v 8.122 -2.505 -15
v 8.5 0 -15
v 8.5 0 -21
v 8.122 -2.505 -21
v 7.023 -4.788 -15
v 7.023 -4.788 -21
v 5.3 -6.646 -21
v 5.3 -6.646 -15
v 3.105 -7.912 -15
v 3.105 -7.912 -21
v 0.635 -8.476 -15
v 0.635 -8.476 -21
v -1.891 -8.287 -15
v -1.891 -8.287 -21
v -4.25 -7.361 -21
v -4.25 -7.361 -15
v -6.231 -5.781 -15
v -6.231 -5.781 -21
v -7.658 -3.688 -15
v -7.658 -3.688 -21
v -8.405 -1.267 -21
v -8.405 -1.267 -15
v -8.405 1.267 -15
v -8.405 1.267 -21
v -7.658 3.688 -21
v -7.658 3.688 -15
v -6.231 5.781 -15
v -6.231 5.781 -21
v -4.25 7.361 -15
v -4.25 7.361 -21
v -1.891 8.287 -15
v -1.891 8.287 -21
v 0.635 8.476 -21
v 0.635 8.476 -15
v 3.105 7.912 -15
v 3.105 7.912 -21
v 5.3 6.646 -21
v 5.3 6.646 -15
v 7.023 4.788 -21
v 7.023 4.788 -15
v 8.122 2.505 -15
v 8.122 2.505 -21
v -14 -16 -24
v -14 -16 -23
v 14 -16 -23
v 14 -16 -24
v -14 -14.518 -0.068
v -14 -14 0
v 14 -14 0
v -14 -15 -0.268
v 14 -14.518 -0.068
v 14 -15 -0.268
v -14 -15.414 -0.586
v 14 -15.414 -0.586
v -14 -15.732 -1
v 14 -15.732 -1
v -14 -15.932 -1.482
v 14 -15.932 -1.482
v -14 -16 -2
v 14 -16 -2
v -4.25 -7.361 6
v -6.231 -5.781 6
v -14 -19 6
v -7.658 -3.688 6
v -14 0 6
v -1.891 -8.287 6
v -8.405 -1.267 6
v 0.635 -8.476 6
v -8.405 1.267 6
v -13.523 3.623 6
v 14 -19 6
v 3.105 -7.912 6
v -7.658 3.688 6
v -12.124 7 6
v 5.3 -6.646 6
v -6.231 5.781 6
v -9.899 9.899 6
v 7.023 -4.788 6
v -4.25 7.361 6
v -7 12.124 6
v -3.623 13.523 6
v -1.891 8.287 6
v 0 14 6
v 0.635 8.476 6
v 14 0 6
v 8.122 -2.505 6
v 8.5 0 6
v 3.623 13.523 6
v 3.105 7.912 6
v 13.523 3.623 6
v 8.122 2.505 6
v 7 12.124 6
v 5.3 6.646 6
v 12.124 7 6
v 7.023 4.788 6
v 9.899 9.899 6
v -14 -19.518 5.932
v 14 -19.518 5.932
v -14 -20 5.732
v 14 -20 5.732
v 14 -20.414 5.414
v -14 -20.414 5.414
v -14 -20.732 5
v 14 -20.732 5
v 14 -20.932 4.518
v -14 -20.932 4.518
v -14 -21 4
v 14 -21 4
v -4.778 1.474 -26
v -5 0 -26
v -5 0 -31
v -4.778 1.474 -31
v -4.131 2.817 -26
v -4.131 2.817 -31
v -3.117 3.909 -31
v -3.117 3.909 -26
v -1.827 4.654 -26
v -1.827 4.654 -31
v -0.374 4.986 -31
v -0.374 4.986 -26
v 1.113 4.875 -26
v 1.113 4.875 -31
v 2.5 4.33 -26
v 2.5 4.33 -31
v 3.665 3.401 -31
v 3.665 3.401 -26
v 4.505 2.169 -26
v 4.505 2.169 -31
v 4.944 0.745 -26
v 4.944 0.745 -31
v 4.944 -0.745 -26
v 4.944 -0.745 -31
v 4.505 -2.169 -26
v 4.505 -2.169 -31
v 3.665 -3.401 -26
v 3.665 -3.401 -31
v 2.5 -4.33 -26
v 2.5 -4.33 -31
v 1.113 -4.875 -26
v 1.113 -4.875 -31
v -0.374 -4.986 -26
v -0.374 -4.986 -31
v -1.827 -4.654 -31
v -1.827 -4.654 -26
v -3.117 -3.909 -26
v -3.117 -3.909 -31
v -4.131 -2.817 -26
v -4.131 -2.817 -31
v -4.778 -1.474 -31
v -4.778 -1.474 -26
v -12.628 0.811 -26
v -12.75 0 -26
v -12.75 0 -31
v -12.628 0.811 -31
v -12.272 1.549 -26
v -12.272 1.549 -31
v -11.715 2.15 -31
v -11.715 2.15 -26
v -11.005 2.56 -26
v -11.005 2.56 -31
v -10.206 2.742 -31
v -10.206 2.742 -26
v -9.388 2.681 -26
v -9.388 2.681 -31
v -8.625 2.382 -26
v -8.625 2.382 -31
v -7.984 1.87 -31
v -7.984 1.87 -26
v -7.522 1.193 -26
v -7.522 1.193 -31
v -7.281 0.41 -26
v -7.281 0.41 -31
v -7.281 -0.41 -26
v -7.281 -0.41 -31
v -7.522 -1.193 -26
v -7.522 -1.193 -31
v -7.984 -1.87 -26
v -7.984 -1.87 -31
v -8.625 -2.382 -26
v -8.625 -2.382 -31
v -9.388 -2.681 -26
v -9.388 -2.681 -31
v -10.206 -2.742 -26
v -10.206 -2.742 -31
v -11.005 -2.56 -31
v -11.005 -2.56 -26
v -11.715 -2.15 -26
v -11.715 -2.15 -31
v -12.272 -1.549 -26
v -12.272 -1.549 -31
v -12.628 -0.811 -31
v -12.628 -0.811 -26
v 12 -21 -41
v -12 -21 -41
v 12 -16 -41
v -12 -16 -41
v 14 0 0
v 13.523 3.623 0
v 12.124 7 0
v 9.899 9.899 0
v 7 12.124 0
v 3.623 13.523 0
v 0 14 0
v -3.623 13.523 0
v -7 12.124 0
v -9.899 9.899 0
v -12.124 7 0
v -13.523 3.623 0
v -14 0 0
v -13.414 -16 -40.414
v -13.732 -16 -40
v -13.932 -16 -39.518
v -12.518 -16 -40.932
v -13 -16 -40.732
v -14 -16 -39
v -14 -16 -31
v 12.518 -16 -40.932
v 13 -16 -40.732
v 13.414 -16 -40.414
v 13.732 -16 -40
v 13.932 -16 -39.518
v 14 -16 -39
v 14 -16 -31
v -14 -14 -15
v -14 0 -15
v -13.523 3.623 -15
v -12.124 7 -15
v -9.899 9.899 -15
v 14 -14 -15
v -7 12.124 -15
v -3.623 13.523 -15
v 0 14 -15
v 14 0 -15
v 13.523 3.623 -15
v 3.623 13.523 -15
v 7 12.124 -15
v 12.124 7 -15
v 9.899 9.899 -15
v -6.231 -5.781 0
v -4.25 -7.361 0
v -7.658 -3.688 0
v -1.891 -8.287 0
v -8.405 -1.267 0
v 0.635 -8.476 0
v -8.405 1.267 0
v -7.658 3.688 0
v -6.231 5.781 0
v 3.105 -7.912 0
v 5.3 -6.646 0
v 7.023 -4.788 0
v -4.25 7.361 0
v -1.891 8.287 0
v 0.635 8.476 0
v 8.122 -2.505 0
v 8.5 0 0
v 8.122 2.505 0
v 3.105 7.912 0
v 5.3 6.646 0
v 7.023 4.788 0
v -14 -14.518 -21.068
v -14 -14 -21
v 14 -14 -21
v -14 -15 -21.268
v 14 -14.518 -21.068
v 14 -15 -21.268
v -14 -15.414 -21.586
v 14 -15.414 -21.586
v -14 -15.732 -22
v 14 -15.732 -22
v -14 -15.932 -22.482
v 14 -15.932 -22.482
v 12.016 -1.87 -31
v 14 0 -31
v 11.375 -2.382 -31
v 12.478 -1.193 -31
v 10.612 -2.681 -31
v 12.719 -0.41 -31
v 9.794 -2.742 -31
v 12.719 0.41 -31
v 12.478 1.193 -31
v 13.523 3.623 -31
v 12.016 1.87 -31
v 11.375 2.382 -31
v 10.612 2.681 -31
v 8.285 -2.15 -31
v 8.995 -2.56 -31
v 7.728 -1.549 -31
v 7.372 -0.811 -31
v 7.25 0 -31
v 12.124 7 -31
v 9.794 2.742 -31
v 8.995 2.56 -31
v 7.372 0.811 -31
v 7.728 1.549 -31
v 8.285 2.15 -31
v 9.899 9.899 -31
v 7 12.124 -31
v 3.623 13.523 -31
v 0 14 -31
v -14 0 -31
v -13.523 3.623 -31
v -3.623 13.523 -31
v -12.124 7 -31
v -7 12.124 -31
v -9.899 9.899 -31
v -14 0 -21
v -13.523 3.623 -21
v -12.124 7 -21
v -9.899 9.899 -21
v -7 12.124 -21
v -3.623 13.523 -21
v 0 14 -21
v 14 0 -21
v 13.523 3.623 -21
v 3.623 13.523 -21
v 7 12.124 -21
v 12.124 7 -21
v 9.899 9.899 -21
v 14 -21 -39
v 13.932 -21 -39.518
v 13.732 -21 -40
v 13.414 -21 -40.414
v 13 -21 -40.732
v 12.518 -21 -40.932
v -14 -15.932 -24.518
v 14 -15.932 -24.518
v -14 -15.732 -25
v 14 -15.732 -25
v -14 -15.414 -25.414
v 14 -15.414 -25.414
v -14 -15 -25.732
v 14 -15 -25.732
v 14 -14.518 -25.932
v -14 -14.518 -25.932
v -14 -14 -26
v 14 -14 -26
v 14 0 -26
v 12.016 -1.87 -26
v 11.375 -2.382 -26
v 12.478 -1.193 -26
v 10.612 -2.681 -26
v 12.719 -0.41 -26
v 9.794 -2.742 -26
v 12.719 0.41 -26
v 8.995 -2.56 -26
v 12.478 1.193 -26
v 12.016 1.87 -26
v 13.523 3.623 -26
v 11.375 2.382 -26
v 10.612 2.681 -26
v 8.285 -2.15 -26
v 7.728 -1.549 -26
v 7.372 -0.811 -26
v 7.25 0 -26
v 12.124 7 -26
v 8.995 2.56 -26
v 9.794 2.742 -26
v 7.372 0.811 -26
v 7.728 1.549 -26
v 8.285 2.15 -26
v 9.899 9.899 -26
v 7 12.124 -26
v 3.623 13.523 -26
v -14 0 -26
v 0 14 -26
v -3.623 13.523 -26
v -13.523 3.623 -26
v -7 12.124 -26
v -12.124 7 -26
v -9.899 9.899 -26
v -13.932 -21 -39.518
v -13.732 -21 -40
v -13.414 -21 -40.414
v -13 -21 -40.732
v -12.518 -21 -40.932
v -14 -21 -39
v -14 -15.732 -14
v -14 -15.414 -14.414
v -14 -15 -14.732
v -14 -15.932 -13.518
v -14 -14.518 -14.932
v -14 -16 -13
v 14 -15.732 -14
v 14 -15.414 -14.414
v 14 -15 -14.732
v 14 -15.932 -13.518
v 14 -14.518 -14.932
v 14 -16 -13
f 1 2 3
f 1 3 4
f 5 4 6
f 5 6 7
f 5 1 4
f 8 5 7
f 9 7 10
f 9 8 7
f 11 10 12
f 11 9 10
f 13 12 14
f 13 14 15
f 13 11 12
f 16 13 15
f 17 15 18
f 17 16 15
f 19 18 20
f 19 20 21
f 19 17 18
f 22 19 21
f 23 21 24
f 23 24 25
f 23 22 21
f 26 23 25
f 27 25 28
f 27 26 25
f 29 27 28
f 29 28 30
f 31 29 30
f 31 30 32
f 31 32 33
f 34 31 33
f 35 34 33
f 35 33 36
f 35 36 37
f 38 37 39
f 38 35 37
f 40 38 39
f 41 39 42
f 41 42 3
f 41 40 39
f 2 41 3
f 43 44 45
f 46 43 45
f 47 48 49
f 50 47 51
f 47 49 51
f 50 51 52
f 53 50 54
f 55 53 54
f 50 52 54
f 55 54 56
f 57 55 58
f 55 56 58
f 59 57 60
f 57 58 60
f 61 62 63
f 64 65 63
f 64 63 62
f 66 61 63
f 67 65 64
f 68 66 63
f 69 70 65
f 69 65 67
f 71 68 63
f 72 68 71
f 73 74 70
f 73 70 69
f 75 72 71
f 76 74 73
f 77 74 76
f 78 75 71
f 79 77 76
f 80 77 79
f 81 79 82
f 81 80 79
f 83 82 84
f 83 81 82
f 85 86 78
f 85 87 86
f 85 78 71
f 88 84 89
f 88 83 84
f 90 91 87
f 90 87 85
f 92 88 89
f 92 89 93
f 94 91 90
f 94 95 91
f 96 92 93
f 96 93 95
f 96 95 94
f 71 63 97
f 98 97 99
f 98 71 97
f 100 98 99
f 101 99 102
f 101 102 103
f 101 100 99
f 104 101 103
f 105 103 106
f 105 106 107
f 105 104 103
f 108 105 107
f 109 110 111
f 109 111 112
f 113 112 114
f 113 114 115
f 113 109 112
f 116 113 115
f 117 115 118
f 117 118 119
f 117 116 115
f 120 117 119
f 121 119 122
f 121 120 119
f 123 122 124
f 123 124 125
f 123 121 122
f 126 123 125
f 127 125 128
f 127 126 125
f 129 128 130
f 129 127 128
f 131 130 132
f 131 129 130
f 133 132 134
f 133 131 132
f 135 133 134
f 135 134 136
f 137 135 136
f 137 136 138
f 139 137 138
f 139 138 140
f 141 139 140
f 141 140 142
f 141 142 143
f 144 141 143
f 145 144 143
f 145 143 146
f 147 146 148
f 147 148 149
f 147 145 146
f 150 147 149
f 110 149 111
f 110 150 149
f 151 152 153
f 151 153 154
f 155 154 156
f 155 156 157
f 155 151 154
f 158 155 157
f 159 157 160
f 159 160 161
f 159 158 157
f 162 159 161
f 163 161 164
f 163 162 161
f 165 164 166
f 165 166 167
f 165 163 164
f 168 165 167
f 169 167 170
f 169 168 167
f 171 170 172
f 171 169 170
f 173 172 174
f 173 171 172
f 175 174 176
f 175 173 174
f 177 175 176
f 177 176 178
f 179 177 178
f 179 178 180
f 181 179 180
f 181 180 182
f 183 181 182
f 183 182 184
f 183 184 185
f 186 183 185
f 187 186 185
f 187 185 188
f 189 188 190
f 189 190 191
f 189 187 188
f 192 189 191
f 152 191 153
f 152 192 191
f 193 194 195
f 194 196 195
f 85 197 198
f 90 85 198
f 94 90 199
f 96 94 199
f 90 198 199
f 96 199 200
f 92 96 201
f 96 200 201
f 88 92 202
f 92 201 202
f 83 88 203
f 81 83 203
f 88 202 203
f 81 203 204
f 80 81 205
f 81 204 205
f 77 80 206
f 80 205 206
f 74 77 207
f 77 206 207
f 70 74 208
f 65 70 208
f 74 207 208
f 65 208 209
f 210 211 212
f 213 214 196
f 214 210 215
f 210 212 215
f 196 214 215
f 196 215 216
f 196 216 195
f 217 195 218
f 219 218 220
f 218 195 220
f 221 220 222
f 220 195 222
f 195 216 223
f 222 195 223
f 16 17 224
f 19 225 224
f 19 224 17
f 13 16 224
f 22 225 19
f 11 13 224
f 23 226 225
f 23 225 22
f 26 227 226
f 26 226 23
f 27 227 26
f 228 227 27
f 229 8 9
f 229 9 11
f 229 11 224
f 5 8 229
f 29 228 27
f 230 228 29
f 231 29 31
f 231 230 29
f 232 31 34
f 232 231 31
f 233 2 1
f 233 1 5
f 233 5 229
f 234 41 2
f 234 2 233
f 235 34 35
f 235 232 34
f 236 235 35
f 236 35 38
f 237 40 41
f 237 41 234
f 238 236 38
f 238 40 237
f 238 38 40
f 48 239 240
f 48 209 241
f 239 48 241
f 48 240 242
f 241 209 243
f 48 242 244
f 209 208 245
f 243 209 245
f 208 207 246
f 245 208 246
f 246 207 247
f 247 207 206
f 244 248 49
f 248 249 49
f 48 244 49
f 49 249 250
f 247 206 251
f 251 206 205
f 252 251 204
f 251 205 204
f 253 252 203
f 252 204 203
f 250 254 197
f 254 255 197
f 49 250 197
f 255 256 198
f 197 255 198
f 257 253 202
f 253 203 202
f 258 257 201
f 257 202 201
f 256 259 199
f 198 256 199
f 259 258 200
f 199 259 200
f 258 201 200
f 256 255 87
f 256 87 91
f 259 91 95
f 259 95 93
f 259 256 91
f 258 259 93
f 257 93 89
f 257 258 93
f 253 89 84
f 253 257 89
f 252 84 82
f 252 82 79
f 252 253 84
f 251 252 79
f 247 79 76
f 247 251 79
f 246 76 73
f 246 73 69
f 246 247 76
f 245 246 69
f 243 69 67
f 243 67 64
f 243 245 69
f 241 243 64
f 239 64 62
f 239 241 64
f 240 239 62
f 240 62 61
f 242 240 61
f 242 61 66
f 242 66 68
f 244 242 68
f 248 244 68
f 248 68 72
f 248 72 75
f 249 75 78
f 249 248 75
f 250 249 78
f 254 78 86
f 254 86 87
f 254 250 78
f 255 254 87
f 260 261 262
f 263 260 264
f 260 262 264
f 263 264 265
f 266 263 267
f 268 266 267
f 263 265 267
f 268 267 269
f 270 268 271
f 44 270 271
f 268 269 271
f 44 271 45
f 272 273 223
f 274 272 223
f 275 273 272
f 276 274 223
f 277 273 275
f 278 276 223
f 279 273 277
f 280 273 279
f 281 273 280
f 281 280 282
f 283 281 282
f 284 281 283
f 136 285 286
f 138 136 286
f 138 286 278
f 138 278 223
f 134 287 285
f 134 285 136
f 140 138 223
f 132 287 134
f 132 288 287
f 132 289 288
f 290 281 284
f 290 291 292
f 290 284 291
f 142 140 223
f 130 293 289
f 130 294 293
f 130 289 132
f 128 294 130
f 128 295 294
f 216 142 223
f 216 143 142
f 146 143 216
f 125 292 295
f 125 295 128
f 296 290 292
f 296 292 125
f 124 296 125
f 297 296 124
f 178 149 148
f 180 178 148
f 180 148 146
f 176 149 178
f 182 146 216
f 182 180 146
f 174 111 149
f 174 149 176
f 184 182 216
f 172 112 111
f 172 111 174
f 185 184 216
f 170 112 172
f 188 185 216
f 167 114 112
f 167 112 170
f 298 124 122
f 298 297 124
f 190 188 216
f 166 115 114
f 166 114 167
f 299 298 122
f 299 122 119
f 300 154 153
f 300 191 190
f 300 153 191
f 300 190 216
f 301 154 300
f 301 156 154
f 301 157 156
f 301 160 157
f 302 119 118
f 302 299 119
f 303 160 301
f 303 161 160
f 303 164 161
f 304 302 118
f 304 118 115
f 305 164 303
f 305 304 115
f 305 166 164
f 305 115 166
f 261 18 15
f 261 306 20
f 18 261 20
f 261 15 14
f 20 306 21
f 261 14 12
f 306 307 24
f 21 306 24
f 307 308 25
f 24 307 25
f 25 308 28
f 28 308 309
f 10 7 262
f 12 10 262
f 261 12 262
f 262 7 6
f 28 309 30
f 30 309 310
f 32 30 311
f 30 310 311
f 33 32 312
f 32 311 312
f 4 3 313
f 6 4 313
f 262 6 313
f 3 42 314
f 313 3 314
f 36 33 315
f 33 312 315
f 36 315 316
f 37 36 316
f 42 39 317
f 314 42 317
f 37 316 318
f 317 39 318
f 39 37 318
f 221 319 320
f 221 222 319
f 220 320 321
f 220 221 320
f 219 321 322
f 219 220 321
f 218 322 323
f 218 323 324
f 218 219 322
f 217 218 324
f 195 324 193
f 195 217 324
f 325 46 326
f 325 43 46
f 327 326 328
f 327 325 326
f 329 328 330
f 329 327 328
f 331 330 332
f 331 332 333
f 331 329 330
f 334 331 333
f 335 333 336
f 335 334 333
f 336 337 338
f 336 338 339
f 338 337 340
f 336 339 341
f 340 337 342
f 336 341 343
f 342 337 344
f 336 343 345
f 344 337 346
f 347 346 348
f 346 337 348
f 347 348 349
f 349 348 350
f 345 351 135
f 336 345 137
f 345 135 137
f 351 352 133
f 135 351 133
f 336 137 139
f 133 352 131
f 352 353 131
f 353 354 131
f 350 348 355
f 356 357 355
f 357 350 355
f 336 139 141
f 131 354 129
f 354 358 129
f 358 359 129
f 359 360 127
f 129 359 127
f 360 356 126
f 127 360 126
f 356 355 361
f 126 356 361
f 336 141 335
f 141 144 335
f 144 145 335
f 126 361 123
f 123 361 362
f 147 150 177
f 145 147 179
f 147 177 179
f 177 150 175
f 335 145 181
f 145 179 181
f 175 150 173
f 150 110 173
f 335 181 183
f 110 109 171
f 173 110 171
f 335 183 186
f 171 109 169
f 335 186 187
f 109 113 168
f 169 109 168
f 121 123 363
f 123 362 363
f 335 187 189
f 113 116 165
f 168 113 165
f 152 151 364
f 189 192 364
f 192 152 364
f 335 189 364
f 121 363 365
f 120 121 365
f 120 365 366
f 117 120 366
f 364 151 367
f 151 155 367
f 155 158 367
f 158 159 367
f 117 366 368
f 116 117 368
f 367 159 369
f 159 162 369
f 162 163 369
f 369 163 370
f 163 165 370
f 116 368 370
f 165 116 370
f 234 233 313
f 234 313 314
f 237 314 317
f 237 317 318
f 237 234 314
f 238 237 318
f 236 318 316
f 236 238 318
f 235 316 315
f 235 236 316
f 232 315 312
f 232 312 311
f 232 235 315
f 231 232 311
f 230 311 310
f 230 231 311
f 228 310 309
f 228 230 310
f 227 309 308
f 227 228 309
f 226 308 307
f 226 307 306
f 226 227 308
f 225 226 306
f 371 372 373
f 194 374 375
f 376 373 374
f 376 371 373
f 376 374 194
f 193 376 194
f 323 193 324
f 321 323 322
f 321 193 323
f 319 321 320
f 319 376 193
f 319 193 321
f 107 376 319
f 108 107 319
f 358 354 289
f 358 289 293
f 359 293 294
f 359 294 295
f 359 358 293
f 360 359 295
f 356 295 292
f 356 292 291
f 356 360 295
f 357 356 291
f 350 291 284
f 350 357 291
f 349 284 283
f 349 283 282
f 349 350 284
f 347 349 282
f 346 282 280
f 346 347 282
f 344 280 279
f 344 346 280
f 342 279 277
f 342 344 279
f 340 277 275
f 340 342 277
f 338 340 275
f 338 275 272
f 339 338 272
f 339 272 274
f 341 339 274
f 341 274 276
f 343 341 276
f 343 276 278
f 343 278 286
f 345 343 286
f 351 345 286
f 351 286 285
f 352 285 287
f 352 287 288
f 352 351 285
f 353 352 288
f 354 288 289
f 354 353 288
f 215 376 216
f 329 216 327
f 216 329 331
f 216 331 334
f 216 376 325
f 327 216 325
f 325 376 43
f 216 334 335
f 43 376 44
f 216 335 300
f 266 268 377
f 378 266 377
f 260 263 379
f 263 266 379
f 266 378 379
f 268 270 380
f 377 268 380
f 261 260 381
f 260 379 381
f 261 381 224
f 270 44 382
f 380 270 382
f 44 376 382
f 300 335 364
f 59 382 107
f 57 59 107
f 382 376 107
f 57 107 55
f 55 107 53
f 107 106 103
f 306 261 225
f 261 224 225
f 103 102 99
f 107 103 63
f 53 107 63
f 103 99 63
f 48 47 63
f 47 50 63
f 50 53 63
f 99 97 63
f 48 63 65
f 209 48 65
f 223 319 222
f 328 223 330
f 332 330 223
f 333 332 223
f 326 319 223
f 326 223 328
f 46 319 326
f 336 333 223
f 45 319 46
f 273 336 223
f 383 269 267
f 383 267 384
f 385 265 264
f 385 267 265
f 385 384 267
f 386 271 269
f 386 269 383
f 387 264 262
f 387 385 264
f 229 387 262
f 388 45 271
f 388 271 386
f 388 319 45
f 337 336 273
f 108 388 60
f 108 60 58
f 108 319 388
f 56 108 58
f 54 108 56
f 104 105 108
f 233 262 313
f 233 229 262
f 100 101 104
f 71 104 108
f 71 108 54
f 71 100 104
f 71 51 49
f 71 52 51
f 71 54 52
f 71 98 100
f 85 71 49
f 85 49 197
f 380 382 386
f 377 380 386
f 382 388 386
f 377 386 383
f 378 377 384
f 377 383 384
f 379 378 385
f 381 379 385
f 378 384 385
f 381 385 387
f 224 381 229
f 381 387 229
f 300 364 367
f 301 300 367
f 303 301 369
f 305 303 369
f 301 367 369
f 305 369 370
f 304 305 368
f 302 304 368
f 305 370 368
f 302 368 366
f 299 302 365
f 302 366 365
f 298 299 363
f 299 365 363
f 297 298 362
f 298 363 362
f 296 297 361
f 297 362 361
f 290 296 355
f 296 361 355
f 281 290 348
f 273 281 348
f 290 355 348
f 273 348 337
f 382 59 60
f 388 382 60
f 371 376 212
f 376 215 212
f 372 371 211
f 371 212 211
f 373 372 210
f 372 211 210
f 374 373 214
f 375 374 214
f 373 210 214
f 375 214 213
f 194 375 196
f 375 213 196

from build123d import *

# Parameters (mm, degrees)
SKETCH1_R           = 8.5
BOSS_EXTRUDE1_DEPTH = 6
SKETCH2_R           = 8.5
BOSS_EXTRUDE2_DEPTH = 6
SKETCH3_R           = 5
SKETCH3_R_2         = 2.75
BOSS_EXTRUDE3_DEPTH = 5
SKETCH4_W           = 28
SKETCH4_H           = 5
BOSS_EXTRUDE5_DEPTH = 47
FILLET1_R           = 2


with BuildPart() as part:
    # Sketch1 → Boss-Extrude1 (new body)
    with BuildSketch(Plane.XY):
        with BuildLine():
            Line((14, -16), (14, 0))
            ThreePointArc((14, 0), (0, 14), (-14, 0))
            Line((-14, 0), (-14, -16))
            Line((-14, -16), (14, -16))
        make_face()
        Circle(SKETCH1_R, mode=Mode.SUBTRACT)
    extrude(amount=BOSS_EXTRUDE1_DEPTH)



with BuildPart() as body_2:
    # Sketch2 → Boss-Extrude2 (new body)
    with BuildSketch(Plane(origin=(0, 0, -15), x_dir=(-1, 0, 0), z_dir=(0, 0, -1))):
        with BuildLine():
            Line((-14, -16), (-14, 0))
            ThreePointArc((-14, 0), (0, 14), (14, 0))
            Line((14, 0), (14, -16))
            Line((14, -16), (-14, -16))
        make_face()
        with Locations(Location((0, 0, 0), (0, 0, 180))):
            Circle(SKETCH2_R, mode=Mode.SUBTRACT)
    extrude(amount=BOSS_EXTRUDE2_DEPTH)


with BuildPart() as body_3:
    # Sketch3 → Boss-Extrude3 (new body)
    with BuildSketch(Plane(origin=(0, 0, -26), x_dir=(-1, 0, 0), z_dir=(0, 0, -1))):
        with BuildLine():
            Line((-14, -16), (14, -16))
            Line((14, -16), (14, 0))
            ThreePointArc((14, 0), (0, 14), (-14, 0))
            Line((-14, 0), (-14, -16))
        make_face()
        Circle(SKETCH3_R, mode=Mode.SUBTRACT)
        with Locations((-10, 0)):
            Circle(SKETCH3_R_2, mode=Mode.SUBTRACT)
        with Locations((10, 0)):
            Circle(SKETCH3_R_2, mode=Mode.SUBTRACT)
    extrude(amount=BOSS_EXTRUDE3_DEPTH)


with BuildPart() as part_1:
    add(part.part)

    add(body_2.part)  # Boss-Extrude5 merges body 2

    add(body_3.part)  # Boss-Extrude5 merges body 3
    # Sketch4 → Boss-Extrude5 (add)
    with BuildSketch(Plane.XY.offset(6)):
        with Locations((0, -18.5)):
            Rectangle(SKETCH4_W, SKETCH4_H)
    extrude(amount=-BOSS_EXTRUDE5_DEPTH)

    # Fillet1
    fillet1_edges = [part_1.edges().sort_by_distance(p)[0] for p in [
        (0, -21, 6),
        (14, -18.5, -41),
        (-14, -18.5, -41),
        (0, -16, -21),
        (0, -16, -15),
        (0, -16, -26),
        (0, -16, 0),
    ]]
    fillet(fillet1_edges, radius=FILLET1_R)


solid = part_1.part
